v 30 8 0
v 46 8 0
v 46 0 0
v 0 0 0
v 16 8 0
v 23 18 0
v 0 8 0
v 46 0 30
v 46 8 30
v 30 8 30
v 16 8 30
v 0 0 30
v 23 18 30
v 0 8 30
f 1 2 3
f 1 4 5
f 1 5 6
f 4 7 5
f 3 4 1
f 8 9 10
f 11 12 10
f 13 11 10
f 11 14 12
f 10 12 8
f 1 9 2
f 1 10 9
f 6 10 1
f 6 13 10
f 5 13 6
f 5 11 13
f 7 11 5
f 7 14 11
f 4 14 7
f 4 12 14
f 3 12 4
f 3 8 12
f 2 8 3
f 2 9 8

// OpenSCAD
$fn = 32;

// ----------------------------------------------------------------------
// V guide rail: vrib, 46 mm wide
// ----------------------------------------------------------------------

// --- parameters (mm) ---
rail_w = 46;              // rail width, X
base_t = 8;               // base plate thickness
v_depth = 10;             // V feature depth / height
v_half_w = 7;             // half width of the V at the base face
plate_t = 30;             // rail length, Z (the extrusion height)

profile = [[0, 0], [46, 0], [46, 8], [30, 8], [23, 18], [16, 8], [0, 8]];  // primary outline, 7 points, counter clockwise

// --- the one profile operation ---
linear_extrude(height = plate_t) polygon(points = profile);
